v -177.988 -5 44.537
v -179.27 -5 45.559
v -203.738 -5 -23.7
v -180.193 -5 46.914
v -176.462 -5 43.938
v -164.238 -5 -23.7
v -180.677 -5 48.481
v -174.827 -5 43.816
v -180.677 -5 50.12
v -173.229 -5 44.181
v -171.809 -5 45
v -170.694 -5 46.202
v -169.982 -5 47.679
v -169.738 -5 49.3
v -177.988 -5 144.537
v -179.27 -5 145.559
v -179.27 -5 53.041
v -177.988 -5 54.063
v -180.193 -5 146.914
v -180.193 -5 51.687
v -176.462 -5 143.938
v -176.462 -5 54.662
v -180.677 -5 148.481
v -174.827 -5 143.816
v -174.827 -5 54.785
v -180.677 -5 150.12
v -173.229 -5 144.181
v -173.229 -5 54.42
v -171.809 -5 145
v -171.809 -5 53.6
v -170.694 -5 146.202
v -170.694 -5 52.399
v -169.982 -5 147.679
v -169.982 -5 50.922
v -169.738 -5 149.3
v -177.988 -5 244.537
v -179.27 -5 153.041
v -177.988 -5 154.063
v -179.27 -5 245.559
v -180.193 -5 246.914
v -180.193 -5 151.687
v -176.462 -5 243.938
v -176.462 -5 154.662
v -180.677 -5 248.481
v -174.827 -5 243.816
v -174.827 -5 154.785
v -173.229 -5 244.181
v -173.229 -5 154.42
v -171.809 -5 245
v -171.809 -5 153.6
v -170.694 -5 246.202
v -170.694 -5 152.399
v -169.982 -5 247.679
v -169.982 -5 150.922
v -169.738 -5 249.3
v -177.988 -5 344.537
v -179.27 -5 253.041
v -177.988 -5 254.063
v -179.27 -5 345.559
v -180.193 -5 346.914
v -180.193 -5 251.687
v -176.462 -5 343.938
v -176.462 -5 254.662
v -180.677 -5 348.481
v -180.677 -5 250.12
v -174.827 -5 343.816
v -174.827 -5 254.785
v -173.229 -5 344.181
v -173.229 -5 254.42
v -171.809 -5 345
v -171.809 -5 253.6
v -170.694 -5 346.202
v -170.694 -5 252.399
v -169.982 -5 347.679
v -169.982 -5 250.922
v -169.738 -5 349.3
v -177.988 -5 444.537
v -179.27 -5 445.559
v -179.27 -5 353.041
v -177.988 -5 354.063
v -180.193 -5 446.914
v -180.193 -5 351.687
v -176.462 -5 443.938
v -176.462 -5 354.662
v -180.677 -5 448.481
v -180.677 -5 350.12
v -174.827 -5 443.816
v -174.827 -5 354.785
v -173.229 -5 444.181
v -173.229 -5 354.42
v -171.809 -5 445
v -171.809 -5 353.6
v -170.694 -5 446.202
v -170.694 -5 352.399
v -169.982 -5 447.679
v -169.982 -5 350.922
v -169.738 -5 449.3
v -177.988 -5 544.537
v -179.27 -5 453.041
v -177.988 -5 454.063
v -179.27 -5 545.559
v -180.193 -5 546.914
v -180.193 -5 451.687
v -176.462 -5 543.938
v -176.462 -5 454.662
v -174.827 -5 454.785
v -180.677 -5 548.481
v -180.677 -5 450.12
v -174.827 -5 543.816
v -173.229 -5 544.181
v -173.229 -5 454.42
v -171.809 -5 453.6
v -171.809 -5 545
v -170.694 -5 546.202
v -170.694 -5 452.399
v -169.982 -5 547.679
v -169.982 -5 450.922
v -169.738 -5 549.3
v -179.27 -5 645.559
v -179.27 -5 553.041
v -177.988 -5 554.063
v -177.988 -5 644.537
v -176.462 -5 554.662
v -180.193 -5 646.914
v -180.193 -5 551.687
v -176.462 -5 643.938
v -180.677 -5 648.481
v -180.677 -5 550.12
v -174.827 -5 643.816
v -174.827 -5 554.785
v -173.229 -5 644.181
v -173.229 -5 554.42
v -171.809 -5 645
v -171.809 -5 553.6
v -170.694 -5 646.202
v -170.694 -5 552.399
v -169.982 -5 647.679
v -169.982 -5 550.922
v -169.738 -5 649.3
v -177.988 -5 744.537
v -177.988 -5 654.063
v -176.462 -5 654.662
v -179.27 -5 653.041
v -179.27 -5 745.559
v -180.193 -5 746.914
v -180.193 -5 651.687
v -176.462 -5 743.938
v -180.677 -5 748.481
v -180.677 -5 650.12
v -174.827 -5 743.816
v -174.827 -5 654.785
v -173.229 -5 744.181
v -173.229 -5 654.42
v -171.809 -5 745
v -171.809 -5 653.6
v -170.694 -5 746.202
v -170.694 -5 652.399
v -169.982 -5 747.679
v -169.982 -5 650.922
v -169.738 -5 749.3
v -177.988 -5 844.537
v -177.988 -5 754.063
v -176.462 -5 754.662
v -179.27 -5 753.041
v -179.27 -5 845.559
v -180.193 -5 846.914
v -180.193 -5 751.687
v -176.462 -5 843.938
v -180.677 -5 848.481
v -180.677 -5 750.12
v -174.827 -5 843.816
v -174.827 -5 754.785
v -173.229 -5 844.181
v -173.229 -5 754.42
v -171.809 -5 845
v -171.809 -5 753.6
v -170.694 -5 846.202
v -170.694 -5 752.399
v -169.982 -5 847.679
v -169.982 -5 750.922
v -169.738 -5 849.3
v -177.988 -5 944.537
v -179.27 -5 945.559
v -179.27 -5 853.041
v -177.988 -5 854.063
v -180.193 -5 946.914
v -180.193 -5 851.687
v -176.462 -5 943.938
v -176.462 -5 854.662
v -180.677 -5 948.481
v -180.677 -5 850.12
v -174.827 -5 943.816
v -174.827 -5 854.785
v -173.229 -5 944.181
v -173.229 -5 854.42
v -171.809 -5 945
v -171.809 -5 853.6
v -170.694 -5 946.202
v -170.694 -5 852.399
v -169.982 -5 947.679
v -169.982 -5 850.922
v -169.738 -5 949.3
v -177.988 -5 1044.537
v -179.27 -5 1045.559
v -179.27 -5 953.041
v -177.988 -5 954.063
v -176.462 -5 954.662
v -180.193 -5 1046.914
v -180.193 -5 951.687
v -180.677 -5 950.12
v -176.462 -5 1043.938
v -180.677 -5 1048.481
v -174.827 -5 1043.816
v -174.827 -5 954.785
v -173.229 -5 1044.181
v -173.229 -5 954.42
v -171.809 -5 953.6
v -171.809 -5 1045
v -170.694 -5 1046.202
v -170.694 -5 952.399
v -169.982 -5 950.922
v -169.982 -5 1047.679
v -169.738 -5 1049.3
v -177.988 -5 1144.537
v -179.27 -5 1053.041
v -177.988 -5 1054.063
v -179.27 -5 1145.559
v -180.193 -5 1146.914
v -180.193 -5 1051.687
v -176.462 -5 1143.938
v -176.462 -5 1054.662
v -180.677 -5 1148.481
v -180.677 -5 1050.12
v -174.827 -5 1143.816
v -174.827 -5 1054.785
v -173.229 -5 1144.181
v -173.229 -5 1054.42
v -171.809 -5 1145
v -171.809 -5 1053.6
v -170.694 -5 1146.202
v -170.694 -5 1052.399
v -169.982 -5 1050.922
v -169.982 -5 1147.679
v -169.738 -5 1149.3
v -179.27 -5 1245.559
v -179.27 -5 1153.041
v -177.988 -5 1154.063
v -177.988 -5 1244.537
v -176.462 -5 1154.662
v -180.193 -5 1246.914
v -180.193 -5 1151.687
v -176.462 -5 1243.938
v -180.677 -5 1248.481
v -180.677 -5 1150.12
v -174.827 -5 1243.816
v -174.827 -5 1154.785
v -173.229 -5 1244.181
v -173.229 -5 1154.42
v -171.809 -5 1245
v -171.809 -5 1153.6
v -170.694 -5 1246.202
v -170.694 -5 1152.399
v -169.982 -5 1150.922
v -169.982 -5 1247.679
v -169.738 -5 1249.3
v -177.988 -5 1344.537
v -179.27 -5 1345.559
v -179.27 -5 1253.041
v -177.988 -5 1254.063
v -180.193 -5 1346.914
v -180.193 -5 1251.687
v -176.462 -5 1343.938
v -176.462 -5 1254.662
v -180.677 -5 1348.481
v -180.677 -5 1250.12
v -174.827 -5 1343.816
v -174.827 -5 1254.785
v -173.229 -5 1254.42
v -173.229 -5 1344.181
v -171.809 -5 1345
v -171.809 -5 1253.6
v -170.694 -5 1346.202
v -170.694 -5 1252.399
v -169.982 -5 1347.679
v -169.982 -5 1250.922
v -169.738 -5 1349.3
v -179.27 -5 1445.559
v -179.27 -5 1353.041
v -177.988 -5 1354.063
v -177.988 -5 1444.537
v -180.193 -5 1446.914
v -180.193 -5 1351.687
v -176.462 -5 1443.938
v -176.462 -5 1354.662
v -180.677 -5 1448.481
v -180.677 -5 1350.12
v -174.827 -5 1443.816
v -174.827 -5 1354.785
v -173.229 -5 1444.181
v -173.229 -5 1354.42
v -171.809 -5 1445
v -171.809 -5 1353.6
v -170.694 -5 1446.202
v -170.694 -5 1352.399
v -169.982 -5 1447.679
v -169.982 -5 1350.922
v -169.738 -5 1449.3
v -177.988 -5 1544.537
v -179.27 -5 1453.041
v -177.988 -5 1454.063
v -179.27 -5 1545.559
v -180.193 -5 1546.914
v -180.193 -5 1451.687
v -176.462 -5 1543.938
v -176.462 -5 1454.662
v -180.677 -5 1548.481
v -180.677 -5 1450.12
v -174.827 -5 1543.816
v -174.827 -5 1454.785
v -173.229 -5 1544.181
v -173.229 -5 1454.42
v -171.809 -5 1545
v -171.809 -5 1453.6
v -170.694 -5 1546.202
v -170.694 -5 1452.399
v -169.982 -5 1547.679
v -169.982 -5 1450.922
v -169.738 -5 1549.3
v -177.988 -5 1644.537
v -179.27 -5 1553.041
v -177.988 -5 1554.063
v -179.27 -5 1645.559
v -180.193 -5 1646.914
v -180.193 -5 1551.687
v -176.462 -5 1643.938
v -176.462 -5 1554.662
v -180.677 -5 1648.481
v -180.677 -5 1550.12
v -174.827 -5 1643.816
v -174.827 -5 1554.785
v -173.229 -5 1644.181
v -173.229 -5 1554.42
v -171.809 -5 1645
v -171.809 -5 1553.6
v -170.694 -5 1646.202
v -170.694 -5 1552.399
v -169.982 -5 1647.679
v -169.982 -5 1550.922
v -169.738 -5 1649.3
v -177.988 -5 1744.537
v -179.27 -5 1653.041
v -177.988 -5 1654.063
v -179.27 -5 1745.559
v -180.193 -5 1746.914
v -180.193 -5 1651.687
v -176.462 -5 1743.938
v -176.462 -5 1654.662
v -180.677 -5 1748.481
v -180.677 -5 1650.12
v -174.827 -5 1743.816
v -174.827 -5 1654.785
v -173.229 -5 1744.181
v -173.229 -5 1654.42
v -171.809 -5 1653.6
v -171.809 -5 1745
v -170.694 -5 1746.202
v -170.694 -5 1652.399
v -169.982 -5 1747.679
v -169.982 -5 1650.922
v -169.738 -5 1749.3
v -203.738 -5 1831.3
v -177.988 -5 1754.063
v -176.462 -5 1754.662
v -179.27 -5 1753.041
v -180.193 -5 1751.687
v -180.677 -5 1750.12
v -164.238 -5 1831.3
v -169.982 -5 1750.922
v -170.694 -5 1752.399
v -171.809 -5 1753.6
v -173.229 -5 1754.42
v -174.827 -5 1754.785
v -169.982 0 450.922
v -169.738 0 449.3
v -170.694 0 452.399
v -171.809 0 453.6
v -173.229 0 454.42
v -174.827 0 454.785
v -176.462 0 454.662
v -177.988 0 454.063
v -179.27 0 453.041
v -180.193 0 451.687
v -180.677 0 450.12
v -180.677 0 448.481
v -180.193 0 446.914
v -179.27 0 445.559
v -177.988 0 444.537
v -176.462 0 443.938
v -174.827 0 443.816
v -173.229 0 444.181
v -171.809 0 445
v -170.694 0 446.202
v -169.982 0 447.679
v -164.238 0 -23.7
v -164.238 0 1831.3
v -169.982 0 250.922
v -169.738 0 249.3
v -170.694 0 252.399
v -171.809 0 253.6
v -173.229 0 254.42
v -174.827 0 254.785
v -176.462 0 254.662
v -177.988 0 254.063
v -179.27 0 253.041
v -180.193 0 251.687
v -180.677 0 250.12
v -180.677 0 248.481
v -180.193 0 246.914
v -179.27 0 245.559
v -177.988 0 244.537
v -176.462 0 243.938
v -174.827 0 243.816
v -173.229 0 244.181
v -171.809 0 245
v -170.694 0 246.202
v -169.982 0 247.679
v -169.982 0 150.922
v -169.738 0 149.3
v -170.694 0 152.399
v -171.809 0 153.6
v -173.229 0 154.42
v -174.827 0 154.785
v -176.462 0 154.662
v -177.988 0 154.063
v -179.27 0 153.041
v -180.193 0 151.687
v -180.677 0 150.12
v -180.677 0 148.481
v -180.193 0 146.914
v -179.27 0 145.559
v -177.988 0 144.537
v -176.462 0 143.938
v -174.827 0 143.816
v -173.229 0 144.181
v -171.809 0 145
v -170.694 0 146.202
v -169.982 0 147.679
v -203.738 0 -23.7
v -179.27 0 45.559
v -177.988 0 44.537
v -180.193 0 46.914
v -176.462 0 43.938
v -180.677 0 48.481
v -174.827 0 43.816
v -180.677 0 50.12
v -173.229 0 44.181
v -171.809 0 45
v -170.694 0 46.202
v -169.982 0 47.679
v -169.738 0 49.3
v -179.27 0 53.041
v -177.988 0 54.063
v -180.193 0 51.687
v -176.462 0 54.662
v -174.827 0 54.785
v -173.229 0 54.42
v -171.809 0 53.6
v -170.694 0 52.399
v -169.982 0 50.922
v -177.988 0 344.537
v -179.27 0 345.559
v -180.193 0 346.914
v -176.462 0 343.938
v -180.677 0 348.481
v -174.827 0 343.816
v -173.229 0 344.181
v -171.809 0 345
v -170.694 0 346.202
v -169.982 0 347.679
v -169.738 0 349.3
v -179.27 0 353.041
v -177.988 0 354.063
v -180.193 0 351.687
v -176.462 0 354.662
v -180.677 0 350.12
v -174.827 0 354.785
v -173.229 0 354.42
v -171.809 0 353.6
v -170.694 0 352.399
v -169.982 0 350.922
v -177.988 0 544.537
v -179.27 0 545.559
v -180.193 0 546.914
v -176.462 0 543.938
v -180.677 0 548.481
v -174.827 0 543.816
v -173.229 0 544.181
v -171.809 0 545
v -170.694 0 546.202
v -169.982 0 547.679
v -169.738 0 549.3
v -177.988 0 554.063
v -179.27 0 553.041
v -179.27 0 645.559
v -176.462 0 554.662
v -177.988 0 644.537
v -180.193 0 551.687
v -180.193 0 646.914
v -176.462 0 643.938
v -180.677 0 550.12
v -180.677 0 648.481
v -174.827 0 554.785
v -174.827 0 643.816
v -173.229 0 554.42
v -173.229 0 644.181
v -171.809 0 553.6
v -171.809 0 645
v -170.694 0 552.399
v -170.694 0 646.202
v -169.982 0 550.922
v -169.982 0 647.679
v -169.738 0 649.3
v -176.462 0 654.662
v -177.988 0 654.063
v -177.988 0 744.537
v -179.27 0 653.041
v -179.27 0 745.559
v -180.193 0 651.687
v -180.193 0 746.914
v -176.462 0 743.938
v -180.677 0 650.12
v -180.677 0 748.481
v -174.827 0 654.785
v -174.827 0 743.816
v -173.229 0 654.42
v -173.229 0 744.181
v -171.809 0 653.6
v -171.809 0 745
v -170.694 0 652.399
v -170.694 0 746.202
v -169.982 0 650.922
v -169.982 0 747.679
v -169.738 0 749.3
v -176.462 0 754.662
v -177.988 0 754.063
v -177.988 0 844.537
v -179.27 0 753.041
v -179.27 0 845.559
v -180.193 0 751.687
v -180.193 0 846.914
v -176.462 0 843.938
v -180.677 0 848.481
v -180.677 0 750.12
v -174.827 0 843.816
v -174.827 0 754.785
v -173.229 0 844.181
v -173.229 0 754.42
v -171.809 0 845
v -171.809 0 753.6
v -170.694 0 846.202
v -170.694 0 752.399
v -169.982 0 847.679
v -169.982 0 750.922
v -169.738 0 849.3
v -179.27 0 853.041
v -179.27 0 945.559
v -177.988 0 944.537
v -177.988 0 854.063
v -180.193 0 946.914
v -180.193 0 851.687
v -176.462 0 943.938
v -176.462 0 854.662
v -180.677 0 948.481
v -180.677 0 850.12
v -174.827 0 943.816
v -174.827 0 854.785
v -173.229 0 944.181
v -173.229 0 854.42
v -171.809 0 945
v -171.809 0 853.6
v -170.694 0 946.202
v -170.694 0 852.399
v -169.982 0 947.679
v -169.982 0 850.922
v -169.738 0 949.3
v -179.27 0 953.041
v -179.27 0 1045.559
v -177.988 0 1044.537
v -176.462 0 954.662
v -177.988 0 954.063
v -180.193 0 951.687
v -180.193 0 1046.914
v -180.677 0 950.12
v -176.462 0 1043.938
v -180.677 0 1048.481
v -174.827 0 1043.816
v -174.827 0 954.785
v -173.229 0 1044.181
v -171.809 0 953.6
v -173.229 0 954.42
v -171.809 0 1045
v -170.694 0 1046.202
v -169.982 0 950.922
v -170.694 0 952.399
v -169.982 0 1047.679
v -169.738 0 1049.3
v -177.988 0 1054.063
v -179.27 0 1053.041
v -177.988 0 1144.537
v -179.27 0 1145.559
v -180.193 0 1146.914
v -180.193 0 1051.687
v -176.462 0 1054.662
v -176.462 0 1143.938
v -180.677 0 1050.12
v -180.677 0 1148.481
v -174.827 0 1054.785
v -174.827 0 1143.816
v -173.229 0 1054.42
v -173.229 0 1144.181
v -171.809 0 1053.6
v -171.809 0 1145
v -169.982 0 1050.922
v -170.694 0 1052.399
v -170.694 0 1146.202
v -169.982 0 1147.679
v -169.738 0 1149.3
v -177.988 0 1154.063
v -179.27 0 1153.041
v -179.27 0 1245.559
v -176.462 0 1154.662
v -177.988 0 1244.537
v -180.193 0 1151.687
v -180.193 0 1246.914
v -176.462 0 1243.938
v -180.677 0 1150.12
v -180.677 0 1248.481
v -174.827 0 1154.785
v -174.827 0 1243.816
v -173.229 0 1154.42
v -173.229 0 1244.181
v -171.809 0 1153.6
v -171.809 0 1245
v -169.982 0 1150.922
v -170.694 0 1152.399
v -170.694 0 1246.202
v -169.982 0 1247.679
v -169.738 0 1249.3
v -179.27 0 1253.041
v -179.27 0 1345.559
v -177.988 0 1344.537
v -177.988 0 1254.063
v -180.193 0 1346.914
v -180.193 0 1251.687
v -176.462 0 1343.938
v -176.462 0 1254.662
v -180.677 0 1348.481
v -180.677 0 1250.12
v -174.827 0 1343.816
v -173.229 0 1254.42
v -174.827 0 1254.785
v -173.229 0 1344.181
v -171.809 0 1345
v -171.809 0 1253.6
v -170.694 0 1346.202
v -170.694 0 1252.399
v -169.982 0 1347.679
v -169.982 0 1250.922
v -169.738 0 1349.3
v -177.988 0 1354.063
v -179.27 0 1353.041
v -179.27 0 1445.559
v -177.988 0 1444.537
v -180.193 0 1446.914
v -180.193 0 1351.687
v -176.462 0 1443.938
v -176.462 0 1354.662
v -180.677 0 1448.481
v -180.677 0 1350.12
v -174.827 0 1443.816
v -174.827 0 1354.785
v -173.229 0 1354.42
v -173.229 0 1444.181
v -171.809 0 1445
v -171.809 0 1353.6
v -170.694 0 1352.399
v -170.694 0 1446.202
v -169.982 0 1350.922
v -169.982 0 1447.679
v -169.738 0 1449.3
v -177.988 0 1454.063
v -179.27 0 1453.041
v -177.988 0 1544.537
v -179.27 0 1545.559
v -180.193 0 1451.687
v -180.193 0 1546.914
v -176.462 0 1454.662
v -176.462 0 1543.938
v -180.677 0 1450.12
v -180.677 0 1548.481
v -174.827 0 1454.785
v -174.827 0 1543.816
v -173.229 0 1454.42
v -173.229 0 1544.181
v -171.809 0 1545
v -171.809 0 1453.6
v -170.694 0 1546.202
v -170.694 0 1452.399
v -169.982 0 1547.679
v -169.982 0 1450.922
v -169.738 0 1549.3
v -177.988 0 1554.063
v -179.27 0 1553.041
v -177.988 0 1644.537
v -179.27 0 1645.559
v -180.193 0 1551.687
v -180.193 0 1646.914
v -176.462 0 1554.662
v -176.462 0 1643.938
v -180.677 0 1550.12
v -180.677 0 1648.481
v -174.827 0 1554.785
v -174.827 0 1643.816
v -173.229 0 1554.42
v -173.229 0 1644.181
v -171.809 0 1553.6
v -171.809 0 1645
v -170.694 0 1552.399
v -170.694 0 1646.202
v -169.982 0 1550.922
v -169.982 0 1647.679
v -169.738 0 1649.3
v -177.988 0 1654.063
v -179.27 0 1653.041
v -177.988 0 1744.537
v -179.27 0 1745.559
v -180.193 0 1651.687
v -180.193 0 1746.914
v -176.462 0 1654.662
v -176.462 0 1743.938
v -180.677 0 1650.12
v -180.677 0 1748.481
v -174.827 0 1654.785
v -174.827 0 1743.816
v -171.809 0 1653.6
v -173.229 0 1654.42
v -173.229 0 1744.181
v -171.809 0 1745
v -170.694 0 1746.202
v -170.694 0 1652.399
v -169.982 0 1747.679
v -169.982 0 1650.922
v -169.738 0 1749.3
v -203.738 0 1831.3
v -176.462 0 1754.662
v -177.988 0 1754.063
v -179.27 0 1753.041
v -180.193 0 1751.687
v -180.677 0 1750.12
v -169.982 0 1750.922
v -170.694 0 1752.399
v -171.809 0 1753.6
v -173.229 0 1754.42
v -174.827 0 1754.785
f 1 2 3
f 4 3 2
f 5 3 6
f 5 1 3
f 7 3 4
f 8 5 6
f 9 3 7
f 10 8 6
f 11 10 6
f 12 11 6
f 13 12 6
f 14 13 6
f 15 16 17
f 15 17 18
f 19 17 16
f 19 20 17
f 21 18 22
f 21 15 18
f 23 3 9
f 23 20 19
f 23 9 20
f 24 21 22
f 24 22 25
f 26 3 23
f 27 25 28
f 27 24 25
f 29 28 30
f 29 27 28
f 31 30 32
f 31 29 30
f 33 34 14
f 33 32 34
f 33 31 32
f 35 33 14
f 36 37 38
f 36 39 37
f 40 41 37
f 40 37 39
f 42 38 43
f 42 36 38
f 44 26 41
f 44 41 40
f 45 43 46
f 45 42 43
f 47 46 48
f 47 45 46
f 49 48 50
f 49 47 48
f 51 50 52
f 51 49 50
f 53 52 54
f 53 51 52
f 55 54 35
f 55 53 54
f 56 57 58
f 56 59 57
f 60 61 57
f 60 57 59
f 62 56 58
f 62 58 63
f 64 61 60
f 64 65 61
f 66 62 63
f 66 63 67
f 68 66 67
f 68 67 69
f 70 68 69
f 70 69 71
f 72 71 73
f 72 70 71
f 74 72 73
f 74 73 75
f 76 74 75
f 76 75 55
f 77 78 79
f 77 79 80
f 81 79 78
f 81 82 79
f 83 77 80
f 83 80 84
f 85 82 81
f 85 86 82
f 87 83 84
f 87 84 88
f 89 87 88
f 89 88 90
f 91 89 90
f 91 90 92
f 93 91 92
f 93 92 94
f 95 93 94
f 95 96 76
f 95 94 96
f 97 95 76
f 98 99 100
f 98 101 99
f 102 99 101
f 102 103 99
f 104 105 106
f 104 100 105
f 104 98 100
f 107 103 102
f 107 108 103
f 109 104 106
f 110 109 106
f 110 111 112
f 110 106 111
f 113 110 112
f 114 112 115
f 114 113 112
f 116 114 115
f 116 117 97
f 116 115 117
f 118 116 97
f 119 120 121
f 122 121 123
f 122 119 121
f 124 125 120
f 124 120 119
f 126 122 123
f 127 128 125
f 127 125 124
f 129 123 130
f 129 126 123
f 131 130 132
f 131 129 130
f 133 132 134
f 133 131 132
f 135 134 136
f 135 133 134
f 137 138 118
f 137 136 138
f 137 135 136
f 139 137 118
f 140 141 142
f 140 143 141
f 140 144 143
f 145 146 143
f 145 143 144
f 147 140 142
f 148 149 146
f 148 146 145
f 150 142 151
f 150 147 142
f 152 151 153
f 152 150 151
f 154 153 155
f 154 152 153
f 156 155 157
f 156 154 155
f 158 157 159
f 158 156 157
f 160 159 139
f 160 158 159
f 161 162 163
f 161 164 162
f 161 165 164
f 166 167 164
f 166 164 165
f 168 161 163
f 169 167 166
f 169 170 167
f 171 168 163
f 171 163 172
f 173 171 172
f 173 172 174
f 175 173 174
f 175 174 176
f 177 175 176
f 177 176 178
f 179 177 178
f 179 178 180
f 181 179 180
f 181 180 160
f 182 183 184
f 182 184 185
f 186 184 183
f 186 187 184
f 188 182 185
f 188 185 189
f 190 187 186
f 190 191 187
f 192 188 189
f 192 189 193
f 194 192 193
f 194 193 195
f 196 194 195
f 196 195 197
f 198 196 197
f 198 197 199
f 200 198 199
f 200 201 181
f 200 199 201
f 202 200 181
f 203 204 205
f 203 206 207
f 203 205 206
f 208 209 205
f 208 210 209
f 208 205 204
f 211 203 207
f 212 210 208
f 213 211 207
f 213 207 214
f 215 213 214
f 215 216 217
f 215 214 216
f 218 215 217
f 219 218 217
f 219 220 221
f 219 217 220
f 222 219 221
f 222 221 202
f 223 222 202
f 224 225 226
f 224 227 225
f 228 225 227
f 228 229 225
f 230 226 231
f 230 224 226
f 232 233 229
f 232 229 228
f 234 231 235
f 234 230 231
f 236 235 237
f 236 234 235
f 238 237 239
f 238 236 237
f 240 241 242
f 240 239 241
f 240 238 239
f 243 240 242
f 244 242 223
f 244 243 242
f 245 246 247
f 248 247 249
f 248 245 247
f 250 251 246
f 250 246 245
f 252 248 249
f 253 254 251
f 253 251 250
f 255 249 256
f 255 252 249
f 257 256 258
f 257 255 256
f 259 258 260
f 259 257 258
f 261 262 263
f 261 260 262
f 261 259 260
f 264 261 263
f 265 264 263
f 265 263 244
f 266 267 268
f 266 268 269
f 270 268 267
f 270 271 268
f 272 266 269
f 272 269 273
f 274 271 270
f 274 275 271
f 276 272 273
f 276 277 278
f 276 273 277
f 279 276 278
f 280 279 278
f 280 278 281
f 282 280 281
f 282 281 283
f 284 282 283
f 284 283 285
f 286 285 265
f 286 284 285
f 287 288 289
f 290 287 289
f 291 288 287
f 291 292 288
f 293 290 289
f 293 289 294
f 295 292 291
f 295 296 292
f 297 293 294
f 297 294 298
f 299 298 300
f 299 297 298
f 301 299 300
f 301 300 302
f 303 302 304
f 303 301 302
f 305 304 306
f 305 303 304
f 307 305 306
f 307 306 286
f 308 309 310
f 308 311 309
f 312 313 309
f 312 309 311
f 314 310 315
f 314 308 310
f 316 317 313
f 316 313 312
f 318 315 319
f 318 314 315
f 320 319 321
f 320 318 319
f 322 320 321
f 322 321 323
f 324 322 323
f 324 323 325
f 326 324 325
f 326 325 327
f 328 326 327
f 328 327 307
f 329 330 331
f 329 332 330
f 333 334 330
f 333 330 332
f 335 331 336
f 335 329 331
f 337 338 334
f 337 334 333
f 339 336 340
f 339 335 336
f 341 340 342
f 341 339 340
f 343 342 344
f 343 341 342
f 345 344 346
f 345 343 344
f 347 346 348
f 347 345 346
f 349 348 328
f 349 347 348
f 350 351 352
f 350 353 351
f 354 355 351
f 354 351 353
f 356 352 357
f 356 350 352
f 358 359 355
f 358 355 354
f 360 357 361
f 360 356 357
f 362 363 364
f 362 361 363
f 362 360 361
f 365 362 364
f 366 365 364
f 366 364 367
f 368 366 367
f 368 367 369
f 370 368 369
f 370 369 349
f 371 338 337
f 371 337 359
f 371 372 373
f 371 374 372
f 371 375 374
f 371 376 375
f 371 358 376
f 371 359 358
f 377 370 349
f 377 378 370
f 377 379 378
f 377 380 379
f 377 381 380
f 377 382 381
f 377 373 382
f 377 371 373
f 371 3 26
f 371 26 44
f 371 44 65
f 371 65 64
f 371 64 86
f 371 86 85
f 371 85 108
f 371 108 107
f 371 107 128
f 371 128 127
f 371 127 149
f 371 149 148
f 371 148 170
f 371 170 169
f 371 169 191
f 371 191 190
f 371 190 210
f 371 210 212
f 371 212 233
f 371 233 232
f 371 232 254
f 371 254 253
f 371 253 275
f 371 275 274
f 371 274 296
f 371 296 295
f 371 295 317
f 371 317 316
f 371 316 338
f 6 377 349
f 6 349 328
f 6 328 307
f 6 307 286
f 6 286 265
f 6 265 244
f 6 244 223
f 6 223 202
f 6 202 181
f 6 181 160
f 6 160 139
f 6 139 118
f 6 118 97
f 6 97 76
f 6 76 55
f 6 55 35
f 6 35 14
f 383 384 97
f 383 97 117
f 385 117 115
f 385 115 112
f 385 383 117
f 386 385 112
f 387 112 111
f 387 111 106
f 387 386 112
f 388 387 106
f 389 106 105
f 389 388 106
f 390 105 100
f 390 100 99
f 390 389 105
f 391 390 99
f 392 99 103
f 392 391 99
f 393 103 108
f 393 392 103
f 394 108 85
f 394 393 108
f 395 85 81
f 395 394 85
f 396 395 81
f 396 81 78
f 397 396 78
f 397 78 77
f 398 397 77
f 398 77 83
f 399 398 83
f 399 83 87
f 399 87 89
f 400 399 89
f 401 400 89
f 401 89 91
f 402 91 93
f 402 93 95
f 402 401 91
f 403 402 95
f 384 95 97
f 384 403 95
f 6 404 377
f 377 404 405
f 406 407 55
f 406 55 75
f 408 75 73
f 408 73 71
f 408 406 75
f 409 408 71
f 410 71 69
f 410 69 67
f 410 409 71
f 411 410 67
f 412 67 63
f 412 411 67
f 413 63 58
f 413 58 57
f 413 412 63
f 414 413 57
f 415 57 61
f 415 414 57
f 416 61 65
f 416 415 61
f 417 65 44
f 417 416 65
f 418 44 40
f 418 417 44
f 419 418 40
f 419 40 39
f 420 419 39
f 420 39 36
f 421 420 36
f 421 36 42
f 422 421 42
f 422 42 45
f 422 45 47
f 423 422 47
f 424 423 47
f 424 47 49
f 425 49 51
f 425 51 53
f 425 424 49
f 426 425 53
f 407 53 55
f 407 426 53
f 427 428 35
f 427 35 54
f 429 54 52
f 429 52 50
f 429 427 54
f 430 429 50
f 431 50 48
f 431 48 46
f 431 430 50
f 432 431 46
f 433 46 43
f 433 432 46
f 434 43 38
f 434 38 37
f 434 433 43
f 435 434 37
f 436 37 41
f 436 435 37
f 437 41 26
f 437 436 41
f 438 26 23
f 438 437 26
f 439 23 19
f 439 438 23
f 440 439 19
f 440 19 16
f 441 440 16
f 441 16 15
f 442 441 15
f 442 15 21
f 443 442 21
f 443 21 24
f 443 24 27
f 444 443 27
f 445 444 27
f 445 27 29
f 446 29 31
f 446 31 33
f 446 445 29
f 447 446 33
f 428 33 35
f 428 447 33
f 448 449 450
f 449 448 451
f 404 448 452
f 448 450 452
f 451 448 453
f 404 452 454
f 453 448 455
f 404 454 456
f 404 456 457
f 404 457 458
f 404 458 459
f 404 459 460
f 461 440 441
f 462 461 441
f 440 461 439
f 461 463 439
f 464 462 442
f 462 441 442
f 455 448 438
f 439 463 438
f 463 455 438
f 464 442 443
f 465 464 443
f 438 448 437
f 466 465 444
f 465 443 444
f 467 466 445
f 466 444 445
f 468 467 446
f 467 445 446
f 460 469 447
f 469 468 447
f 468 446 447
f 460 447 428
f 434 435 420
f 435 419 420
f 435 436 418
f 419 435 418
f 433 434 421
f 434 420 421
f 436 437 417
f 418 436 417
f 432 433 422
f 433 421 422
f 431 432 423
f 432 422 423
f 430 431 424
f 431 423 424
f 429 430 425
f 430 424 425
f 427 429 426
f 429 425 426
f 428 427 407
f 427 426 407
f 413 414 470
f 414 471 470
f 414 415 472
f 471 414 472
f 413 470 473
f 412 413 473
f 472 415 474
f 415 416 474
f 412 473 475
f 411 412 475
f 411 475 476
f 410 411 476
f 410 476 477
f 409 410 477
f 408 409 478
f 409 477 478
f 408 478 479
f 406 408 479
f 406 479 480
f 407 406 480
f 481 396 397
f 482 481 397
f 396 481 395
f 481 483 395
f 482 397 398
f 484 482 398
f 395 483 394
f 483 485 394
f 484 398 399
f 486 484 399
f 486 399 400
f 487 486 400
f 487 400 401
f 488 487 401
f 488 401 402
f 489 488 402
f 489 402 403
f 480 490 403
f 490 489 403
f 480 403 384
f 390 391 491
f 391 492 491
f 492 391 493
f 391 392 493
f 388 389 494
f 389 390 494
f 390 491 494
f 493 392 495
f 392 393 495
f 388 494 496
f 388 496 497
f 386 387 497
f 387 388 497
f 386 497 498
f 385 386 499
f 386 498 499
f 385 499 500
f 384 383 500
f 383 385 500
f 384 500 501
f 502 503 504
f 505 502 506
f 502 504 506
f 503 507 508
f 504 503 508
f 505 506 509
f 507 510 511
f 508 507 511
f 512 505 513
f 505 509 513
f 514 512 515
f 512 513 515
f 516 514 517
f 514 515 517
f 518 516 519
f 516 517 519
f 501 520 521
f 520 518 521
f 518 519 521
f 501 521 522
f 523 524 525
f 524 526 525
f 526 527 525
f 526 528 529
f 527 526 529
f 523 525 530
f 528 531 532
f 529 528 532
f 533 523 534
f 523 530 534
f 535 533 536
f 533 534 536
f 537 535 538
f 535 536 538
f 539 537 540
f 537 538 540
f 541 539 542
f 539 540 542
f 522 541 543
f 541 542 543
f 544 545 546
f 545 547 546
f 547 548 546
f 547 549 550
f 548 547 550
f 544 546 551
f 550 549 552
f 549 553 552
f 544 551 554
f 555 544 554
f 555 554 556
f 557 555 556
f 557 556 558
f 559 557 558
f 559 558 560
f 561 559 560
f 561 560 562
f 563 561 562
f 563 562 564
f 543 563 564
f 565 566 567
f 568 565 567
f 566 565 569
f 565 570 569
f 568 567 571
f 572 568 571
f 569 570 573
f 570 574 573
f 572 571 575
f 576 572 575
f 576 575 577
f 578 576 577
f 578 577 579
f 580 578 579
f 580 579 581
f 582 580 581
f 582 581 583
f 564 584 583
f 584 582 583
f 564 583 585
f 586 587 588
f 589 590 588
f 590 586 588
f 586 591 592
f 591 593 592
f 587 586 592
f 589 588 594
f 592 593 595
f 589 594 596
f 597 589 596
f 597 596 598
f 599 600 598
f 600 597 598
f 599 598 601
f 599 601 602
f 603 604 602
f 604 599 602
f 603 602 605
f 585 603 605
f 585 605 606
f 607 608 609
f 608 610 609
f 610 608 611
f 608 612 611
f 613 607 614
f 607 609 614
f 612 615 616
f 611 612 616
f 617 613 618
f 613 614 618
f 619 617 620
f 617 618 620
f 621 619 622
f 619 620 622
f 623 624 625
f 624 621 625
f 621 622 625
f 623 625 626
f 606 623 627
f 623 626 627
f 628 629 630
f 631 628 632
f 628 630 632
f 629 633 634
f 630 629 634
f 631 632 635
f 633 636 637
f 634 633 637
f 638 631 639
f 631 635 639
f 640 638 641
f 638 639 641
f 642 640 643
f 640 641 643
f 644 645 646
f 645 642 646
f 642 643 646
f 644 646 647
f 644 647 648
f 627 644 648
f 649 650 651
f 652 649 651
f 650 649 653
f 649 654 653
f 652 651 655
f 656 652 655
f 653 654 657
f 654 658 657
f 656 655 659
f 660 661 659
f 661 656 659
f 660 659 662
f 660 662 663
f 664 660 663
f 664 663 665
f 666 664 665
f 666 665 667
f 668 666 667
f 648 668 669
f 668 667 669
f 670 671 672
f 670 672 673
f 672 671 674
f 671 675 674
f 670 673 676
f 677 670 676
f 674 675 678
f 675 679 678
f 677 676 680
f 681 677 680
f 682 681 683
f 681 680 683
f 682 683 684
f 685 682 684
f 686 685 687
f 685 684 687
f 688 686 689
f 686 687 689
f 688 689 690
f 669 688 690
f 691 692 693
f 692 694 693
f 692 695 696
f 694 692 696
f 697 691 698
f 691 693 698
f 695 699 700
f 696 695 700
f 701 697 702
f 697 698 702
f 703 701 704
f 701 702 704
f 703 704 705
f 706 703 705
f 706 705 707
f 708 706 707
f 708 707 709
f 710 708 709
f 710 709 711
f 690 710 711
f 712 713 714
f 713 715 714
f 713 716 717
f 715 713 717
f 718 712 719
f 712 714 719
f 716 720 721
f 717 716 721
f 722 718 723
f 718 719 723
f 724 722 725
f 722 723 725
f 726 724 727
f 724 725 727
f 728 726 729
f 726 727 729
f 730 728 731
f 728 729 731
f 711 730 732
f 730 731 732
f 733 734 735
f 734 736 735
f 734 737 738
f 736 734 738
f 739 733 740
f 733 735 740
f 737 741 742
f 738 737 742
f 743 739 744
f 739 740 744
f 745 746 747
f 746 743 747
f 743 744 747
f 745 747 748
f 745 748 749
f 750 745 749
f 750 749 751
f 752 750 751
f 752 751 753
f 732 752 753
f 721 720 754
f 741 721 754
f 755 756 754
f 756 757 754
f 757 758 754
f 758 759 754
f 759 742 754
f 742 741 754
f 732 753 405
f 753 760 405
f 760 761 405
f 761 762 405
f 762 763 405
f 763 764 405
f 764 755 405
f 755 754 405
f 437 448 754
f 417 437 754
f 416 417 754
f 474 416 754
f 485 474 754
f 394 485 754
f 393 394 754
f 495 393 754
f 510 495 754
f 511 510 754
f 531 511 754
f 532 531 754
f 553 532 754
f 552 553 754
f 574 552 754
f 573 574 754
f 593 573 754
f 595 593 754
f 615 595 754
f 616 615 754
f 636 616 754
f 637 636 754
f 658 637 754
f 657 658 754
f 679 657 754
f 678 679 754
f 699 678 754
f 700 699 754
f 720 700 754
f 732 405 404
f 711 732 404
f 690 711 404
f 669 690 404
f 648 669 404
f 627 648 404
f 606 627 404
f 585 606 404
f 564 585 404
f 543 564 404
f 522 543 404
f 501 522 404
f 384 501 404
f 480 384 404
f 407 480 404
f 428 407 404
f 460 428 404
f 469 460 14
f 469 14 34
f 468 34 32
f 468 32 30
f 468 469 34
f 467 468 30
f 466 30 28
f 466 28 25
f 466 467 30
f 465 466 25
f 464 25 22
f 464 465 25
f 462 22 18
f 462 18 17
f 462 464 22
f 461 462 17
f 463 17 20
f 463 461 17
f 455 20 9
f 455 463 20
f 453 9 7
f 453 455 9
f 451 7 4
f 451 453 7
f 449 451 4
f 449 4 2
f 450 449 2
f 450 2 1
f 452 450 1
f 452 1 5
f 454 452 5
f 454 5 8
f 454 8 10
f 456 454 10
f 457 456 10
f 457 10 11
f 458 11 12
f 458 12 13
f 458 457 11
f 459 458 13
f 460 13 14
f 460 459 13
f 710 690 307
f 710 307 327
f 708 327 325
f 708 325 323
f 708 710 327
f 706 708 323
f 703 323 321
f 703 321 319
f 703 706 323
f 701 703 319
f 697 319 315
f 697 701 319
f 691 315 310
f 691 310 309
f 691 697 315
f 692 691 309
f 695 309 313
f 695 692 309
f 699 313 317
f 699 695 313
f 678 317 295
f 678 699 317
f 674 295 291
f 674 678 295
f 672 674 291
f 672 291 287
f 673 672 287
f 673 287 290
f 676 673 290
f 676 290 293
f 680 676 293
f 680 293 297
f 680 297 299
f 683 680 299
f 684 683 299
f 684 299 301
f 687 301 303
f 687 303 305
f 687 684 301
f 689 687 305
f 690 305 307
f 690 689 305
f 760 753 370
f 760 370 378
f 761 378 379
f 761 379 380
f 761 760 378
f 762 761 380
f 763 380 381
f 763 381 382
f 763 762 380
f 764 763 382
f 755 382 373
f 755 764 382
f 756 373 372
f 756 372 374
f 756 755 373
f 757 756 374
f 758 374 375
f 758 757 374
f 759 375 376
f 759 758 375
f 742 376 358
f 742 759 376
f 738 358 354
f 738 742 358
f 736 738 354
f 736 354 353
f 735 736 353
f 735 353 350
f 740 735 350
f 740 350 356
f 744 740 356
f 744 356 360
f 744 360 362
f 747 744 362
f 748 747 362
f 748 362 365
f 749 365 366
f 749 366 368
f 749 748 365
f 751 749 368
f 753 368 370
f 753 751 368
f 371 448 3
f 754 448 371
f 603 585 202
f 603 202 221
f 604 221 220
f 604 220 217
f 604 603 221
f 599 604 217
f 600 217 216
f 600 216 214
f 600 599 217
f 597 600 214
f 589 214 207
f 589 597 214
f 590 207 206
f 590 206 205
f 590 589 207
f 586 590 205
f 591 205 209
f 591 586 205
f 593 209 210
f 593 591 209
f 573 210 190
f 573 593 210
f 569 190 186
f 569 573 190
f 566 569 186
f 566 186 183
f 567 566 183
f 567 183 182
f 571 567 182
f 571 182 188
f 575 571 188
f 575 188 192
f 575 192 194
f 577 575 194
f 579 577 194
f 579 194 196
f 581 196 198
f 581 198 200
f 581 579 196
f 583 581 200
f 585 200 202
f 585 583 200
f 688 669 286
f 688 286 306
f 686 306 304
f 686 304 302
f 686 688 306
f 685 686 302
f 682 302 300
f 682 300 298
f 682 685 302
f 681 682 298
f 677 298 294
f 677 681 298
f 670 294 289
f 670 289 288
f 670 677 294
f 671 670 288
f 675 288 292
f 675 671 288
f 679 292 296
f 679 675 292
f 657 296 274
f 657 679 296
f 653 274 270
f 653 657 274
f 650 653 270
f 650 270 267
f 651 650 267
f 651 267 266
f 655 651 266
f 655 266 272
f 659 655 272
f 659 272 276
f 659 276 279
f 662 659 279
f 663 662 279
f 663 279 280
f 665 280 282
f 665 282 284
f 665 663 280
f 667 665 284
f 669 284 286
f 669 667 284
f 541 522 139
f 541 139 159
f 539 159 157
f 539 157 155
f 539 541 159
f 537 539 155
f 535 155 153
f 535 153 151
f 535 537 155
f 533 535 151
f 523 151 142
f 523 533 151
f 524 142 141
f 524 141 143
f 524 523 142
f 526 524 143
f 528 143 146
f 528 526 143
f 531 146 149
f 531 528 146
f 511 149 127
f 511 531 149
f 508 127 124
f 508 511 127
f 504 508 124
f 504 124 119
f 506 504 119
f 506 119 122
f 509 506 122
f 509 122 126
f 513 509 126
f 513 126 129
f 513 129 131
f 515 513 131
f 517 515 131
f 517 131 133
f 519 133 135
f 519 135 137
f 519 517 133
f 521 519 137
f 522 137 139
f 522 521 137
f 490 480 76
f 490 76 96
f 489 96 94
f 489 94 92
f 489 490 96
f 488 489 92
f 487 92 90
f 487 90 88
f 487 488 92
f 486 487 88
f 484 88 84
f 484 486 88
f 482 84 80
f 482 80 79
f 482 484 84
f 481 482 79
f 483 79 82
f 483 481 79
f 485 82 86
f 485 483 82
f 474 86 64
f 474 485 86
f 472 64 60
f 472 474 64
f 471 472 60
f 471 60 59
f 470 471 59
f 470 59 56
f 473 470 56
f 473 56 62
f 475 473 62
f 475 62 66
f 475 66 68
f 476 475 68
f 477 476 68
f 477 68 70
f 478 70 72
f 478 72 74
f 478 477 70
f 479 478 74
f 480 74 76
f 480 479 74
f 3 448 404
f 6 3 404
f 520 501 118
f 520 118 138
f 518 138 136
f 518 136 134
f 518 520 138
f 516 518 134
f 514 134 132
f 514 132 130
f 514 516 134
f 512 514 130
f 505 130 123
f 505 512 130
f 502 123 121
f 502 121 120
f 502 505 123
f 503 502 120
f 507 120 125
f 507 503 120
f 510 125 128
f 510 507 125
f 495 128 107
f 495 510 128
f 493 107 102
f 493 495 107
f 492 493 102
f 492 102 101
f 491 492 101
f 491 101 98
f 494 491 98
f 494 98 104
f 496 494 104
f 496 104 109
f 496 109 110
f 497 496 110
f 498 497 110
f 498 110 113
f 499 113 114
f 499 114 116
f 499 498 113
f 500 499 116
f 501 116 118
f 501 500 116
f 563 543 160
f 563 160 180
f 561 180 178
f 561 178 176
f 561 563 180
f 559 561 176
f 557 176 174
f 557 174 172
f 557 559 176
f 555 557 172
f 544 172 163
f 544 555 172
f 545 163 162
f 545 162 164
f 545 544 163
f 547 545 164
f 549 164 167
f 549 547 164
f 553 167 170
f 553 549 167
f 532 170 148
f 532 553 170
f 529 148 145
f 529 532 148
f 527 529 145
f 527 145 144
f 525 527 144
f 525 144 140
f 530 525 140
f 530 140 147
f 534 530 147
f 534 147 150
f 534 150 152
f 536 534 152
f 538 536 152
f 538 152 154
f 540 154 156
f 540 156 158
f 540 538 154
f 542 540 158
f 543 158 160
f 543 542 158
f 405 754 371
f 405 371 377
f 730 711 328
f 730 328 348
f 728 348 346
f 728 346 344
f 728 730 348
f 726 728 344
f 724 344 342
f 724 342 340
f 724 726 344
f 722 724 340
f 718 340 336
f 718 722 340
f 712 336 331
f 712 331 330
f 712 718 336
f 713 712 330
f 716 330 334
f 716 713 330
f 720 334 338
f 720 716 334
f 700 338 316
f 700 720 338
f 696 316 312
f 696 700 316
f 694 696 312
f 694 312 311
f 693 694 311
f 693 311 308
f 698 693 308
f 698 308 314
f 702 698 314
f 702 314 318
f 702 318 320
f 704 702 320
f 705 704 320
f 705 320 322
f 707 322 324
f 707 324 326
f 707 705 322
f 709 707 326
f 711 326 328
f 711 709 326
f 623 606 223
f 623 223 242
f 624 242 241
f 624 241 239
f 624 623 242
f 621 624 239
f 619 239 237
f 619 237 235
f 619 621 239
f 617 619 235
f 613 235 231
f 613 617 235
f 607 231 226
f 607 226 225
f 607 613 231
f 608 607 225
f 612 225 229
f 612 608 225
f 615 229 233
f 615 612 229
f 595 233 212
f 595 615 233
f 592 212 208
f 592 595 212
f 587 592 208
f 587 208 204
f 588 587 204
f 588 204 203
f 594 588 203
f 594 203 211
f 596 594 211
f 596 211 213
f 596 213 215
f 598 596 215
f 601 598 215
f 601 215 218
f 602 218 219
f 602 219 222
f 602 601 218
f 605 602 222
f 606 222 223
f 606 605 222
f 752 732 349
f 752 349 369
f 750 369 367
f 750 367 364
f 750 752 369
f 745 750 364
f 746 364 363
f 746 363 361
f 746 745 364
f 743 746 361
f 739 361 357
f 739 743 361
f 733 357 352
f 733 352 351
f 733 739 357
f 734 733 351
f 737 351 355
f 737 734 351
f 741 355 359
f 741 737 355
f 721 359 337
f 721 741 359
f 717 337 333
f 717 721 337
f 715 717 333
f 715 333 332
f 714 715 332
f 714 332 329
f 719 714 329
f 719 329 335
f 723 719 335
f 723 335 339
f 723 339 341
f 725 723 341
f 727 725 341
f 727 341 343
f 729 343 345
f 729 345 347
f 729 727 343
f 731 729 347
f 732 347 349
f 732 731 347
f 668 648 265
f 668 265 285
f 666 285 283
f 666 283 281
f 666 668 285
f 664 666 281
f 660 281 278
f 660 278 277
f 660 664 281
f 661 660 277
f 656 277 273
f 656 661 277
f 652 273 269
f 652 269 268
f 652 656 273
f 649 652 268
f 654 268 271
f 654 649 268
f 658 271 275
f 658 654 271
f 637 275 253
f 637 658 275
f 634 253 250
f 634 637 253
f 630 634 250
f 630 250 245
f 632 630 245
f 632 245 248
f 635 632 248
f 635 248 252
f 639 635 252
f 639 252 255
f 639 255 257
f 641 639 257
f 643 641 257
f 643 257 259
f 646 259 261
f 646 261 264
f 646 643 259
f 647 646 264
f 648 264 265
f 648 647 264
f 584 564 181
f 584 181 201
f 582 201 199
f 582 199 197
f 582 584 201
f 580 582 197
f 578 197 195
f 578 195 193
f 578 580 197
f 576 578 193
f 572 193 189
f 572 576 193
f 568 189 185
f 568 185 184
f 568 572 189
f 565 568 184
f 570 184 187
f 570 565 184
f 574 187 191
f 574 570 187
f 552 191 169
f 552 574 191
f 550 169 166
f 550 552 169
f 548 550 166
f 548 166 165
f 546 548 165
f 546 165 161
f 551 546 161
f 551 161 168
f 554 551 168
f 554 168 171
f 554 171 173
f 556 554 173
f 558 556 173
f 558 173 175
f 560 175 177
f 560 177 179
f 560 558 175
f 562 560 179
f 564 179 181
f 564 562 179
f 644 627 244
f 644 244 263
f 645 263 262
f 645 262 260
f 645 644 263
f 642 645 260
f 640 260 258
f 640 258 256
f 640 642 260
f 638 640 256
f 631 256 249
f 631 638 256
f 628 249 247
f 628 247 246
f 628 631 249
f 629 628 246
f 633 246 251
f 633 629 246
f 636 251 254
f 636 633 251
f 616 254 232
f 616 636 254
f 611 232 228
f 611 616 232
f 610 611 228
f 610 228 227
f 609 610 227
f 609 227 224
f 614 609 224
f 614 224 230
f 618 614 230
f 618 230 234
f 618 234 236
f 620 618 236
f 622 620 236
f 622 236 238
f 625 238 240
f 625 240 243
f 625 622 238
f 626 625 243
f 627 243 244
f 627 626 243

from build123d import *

# Parameters (mm, degrees)
F0_W     = 39.5
F0_H     = 1855
F0_R     = 5.5
F1_DEPTH = 5


with BuildPart() as f1:
    # F0 (on Front) → F1 (new body)
    with BuildSketch(Plane.XZ):
        with Locations((-183.987974, 903.800355)):
            Rectangle(F0_W, F0_H)
        with Locations((-175.237974, 49.300355)):
            Circle(F0_R, mode=Mode.SUBTRACT)
        with Locations((-175.237974, 149.300355)):
            Circle(F0_R, mode=Mode.SUBTRACT)
        with Locations((-175.237974, 249.300355)):
            Circle(F0_R, mode=Mode.SUBTRACT)
        with Locations((-175.237974, 349.300355)):
            Circle(F0_R, mode=Mode.SUBTRACT)
        with Locations((-175.237974, 449.300355)):
            Circle(F0_R, mode=Mode.SUBTRACT)
        with Locations((-175.237974, 549.300355)):
            Circle(F0_R, mode=Mode.SUBTRACT)
        with Locations((-175.237974, 649.300355)):
            Circle(F0_R, mode=Mode.SUBTRACT)
        with Locations((-175.237974, 749.300355)):
            Circle(F0_R, mode=Mode.SUBTRACT)
        with Locations((-175.237974, 849.300355)):
            Circle(F0_R, mode=Mode.SUBTRACT)
        with Locations((-175.237974, 949.300355)):
            Circle(F0_R, mode=Mode.SUBTRACT)
        with Locations((-175.237974, 1049.300355)):
            Circle(F0_R, mode=Mode.SUBTRACT)
        with Locations((-175.237974, 1149.300355)):
            Circle(F0_R, mode=Mode.SUBTRACT)
        with Locations((-175.237974, 1249.300355)):
            Circle(F0_R, mode=Mode.SUBTRACT)
        with Locations((-175.237974, 1349.300355)):
            Circle(F0_R, mode=Mode.SUBTRACT)
        with Locations((-175.237974, 1449.300355)):
            Circle(F0_R, mode=Mode.SUBTRACT)
        with Locations((-175.237974, 1549.300355)):
            Circle(F0_R, mode=Mode.SUBTRACT)
        with Locations((-175.237974, 1649.300355)):
            Circle(F0_R, mode=Mode.SUBTRACT)
        with Locations((-175.237974, 1749.300355)):
            Circle(F0_R, mode=Mode.SUBTRACT)
    extrude(amount=F1_DEPTH)


solid = f1.part
